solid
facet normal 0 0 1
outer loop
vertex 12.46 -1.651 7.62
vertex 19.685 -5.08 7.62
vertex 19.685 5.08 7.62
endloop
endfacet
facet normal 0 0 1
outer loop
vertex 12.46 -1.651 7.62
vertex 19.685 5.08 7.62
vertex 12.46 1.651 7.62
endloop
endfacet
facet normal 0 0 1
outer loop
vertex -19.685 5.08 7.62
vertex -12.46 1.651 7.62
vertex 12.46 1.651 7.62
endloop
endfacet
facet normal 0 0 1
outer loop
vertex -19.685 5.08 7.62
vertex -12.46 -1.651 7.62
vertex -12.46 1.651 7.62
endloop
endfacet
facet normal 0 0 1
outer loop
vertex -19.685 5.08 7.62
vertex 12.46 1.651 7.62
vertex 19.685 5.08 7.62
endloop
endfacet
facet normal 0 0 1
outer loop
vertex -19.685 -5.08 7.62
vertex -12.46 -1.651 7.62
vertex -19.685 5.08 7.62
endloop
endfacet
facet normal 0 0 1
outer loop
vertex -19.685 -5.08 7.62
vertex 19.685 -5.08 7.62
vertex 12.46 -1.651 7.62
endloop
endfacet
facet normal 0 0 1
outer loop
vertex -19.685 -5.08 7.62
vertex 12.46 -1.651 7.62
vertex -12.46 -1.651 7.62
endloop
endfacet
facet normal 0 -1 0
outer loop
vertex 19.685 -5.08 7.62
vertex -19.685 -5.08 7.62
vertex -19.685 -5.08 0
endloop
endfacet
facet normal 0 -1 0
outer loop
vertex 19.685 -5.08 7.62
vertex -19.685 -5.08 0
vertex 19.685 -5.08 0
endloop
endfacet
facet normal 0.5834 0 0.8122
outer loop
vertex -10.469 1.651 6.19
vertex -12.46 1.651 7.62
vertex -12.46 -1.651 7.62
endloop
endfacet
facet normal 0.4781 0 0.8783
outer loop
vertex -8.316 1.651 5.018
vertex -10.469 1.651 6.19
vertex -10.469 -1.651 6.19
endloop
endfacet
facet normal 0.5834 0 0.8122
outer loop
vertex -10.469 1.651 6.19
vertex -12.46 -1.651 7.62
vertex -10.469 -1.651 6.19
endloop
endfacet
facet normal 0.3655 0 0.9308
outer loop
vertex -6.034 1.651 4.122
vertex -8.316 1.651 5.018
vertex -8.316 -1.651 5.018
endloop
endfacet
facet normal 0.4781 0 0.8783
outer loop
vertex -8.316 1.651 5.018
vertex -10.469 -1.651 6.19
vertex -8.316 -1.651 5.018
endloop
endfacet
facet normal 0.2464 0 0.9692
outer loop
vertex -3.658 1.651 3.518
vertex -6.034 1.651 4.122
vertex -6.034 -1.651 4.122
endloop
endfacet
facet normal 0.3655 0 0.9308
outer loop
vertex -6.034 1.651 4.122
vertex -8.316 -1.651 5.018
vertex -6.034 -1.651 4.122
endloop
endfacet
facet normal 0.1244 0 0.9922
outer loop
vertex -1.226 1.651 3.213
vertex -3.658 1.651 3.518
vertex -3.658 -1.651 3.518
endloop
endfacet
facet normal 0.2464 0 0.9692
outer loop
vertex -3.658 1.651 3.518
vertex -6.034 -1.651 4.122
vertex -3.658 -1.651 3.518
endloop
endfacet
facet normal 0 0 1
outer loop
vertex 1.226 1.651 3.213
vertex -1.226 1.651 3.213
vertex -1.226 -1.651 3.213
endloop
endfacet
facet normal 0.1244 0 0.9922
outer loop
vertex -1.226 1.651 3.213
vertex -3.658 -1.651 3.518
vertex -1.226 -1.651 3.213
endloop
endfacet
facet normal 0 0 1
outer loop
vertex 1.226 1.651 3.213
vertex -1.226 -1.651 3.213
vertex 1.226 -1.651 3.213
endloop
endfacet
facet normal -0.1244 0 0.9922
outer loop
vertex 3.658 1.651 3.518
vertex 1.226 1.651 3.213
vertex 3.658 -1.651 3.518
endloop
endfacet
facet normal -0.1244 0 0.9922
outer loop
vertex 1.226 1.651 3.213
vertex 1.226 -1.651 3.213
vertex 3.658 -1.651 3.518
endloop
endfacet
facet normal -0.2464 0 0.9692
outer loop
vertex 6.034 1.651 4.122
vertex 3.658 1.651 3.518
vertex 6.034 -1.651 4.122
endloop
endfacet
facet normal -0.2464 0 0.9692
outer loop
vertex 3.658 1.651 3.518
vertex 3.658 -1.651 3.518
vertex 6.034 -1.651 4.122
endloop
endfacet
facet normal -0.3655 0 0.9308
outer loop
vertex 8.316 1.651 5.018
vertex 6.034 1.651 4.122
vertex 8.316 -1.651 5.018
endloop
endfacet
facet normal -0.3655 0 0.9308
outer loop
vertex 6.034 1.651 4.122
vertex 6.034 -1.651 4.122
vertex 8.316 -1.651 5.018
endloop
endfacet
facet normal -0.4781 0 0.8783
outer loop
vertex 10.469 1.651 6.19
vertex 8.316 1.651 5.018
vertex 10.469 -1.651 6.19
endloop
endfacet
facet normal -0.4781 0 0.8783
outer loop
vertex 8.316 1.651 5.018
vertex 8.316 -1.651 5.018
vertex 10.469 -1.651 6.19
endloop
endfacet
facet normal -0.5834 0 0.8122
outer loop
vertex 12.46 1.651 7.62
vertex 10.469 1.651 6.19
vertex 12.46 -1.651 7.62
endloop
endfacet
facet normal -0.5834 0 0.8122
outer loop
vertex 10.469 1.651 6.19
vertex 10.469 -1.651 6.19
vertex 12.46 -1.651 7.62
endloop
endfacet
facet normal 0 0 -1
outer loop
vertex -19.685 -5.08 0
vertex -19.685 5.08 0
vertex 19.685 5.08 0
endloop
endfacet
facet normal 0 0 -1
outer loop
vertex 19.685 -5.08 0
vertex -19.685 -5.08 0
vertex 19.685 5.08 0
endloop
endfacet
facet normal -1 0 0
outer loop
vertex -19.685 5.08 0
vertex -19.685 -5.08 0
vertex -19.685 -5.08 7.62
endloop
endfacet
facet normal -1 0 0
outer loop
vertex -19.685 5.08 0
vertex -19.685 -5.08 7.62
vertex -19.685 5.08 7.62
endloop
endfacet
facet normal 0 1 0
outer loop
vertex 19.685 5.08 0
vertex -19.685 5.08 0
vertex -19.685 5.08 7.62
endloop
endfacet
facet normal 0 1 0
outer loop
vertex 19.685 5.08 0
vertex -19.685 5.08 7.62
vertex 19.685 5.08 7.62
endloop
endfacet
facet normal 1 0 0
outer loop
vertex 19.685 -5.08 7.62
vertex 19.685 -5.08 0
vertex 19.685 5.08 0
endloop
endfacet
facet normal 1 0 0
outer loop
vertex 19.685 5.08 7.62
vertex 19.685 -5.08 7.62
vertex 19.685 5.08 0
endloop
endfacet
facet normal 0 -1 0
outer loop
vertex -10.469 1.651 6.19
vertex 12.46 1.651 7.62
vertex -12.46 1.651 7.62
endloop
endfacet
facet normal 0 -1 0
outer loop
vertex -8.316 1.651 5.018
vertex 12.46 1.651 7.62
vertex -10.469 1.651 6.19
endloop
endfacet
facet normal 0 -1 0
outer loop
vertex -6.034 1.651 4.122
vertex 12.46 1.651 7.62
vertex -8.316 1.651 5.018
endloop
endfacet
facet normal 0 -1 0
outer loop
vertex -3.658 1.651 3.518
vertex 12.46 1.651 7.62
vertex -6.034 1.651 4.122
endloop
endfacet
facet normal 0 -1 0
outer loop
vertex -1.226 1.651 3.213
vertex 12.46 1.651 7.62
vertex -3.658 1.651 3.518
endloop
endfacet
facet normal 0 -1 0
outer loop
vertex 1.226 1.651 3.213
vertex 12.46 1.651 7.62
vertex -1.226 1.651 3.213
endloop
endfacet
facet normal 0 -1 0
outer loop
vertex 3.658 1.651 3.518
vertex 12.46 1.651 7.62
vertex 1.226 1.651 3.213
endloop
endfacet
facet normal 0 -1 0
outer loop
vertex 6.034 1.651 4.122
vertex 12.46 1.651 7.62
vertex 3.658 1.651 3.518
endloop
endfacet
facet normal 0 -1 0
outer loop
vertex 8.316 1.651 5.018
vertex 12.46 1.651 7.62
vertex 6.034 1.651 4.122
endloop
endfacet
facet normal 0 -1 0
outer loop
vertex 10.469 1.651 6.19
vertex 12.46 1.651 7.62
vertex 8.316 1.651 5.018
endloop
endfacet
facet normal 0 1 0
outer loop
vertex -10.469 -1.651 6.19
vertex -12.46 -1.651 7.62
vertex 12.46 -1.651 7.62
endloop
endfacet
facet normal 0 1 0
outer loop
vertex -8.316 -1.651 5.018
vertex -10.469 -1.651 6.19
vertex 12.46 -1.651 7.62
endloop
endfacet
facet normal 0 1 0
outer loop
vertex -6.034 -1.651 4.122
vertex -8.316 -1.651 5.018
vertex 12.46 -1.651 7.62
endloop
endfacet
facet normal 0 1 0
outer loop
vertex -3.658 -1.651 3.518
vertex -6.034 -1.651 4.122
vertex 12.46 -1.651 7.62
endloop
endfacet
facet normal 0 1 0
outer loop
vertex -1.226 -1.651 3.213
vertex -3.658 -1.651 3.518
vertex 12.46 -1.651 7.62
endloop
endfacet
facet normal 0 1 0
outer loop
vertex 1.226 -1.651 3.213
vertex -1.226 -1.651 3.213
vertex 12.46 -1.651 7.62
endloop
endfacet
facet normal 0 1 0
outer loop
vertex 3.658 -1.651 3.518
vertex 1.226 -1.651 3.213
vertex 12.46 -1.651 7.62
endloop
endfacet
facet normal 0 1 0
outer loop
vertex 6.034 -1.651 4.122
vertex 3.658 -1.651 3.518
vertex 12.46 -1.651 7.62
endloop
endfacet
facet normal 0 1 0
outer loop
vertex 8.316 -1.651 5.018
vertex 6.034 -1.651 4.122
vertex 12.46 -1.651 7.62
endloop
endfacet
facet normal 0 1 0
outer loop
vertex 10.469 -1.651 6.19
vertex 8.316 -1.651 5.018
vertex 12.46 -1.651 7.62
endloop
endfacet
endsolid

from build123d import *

# Parameters (mm, degrees)
F0_W     = 39.37
F0_H     = 10.16
F1_DEPTH = 7.62
F2_R     = 19.685
F3_DEPTH = 12.7
F4_DEPTH = 3.429
F5_W     = 39.37
F5_H     = 7.62
F6_DEPTH = 3.429


with BuildPart() as f1:
    # F0 (on Top) → F1 (new body)
    with BuildSketch(Plane.XY):
        Rectangle(F0_W, F0_H)
    extrude(amount=F1_DEPTH)

    # F2 (on face) → F3 (cut)
    with BuildSketch(Plane.XZ.offset(5.08)):
        with Locations((0, 22.86)):
            Circle(F2_R)
    extrude(amount=-F3_DEPTH, mode=Mode.SUBTRACT)

    # F2 (on face) → F4 (join)
    with BuildSketch(Plane.XZ.offset(5.08)):
        with BuildLine():
            Line((12.4595997127, 7.62), (-12.4595997127, 7.62))
            ThreePointArc((-12.4595997127, 7.62), (0, 3.175), (12.4595997127, 7.62))
        make_face()
    extrude(amount=-F4_DEPTH)

    # F5 (on face) → F6 (join)
    with BuildSketch(Plane(origin=(0, 5.08, 0), x_dir=(-1, 0, 0), z_dir=(0, 1, 0))):
        with Locations((0, 3.81)):
            Rectangle(F5_W, F5_H)
        with BuildLine():
            Line((-12.4595997127, 7.62), (-19.685, 7.62))
            Line((-19.685, 7.62), (-19.685, 0))
            Line((-19.685, 0), (19.685, 0))
            Line((19.685, 0), (19.685, 7.62))
            Line((19.685, 7.62), (12.4595997127, 7.62))
            ThreePointArc((12.4595997127, 7.62), (0, 3.175), (-12.4595997127, 7.62))
        make_face()
    extrude(amount=-F6_DEPTH)


solid = f1.part
